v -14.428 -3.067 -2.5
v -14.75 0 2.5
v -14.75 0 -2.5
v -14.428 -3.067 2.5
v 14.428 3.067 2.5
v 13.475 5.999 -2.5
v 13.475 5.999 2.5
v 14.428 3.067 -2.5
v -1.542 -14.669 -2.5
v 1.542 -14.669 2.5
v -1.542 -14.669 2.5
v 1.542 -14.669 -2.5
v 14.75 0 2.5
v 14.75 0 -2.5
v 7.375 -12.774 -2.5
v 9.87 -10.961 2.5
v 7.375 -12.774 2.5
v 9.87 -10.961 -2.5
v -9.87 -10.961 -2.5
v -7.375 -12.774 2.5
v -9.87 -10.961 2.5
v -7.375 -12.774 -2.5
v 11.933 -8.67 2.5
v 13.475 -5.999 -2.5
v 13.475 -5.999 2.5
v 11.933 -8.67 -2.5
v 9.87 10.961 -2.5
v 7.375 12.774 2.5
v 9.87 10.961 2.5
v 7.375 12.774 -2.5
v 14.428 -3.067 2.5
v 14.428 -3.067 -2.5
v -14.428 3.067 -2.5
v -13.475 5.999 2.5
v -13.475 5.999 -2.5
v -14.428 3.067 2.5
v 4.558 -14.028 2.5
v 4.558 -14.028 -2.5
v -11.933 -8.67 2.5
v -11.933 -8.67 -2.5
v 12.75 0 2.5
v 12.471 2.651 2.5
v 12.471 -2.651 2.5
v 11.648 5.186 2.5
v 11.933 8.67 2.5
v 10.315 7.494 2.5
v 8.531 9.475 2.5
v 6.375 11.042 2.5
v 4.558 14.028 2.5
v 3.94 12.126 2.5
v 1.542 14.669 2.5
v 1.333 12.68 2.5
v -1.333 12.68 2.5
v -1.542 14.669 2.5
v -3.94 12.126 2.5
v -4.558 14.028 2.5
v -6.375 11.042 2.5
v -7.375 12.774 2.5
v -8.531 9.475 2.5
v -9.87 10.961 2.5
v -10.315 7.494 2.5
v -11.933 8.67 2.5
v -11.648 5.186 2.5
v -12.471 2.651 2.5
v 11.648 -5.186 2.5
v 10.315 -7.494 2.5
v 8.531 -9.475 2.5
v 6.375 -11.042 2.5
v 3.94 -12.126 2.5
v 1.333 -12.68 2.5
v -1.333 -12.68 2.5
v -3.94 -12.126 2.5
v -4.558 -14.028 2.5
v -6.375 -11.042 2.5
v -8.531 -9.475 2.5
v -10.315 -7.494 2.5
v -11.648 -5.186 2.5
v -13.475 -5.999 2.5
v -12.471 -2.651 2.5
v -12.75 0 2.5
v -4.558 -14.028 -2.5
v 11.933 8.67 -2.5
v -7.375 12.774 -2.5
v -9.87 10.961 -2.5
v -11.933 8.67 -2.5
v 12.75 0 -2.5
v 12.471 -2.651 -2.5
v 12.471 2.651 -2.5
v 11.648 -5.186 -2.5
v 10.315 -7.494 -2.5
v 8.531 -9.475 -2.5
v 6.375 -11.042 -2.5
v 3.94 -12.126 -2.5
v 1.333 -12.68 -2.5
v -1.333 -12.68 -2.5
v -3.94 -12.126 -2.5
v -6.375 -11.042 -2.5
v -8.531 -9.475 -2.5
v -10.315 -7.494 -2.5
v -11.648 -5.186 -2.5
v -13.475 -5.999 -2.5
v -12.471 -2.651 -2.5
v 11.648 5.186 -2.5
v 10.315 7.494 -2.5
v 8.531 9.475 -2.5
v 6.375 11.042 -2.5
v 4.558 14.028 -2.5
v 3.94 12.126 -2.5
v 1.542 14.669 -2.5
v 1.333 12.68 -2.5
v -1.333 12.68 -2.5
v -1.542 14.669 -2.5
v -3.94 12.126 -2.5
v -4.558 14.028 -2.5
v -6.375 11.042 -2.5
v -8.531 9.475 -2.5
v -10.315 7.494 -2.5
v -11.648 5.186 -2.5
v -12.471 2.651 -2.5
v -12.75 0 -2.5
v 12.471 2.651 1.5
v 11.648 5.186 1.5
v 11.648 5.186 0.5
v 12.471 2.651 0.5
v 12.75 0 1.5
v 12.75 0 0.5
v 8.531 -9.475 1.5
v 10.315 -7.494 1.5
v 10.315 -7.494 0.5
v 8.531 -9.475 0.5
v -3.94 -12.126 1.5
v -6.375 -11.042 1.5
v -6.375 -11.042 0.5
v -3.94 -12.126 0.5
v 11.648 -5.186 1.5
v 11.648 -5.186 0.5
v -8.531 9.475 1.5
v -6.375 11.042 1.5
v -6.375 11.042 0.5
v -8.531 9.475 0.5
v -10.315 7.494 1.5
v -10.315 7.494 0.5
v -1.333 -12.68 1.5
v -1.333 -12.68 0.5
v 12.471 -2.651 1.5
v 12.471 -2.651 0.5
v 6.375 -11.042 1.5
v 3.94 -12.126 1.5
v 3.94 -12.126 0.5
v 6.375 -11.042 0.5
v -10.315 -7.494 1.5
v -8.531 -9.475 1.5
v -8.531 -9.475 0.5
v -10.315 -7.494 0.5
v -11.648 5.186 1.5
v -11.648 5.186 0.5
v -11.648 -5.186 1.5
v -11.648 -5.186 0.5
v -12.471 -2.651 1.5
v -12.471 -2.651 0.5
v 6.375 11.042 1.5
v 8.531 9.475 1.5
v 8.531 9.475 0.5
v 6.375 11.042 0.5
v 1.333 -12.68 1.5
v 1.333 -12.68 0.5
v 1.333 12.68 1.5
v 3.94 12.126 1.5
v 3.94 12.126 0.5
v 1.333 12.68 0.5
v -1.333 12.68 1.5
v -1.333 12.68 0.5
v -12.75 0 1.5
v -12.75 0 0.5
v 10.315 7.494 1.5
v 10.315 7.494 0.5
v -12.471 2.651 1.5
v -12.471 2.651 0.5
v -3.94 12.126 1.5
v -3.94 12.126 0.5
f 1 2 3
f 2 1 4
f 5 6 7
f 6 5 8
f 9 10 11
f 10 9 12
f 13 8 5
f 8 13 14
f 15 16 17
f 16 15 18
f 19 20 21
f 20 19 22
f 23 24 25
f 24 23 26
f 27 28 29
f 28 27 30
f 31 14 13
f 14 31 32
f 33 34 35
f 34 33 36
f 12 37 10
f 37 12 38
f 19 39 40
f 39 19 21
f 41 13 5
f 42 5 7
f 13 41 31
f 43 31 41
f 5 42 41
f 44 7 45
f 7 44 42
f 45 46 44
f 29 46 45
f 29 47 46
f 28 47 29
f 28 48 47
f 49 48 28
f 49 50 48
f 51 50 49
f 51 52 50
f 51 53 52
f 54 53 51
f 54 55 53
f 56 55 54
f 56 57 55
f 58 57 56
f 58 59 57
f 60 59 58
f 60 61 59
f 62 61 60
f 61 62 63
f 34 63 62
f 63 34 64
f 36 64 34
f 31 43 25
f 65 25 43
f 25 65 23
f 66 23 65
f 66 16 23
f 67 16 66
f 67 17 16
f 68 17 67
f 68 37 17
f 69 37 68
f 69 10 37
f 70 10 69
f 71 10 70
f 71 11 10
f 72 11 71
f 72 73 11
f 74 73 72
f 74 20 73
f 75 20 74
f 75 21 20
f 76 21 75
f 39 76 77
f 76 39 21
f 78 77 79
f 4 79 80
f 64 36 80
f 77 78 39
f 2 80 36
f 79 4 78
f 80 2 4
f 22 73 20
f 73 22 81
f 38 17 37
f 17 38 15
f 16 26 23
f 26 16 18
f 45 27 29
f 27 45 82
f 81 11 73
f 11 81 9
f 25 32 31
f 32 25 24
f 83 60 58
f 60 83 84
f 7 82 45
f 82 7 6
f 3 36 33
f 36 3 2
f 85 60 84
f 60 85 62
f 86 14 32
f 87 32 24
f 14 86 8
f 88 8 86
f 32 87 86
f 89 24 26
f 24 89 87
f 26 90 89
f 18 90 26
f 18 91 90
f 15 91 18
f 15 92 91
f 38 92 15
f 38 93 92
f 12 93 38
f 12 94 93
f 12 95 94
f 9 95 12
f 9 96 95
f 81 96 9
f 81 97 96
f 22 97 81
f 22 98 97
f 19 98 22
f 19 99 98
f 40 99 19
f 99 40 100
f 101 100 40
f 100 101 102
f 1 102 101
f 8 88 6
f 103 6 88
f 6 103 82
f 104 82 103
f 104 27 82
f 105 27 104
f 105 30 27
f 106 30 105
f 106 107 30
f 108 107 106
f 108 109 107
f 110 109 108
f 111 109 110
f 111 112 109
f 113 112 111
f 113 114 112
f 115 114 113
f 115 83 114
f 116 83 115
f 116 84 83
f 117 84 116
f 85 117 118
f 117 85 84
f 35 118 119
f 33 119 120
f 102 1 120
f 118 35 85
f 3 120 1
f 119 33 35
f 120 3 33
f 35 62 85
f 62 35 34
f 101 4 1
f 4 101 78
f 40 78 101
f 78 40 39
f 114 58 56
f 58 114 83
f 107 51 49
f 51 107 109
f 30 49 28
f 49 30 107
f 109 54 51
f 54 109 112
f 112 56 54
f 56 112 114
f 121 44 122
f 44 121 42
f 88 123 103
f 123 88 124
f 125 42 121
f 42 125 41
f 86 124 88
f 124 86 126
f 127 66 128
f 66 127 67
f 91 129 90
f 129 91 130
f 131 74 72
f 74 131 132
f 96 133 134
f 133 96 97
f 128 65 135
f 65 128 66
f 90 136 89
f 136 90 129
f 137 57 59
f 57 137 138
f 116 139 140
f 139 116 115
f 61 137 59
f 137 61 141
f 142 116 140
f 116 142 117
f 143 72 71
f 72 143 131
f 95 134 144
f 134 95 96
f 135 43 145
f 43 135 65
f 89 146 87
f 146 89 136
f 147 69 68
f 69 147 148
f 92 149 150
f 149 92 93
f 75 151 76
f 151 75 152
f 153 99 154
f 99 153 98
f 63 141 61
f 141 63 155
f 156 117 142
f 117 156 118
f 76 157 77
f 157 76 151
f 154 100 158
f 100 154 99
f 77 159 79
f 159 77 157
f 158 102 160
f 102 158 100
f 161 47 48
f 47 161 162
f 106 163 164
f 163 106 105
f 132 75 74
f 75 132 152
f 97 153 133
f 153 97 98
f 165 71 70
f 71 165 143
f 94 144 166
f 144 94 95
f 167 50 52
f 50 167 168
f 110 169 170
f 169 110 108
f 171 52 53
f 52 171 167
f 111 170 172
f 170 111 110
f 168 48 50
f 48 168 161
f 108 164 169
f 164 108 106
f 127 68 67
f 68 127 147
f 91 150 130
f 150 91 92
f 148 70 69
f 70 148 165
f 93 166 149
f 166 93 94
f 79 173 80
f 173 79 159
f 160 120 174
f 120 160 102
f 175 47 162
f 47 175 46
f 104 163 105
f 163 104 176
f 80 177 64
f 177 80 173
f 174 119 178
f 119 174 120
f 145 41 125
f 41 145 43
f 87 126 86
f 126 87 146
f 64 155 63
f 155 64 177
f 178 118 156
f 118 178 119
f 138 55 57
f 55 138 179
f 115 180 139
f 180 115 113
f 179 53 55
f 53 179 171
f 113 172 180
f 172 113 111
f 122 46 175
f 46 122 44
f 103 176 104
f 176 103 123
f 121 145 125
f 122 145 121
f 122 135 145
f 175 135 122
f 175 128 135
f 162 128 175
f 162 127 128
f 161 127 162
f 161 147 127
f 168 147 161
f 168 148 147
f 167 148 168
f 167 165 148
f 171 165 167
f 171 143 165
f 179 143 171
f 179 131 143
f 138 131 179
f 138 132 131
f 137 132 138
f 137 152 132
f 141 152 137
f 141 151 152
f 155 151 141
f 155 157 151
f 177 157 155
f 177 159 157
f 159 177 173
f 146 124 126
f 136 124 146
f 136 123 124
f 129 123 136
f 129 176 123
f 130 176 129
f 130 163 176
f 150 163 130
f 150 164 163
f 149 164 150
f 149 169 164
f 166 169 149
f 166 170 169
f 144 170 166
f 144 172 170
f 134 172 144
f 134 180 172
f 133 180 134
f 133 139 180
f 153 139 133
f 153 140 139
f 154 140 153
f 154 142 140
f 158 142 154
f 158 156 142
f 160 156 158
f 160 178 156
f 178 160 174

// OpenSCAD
//! Keychain Body.

// Make a hollow outer ring.

// Difference extrudes the first object, and then remove all following objects inside the difference.
difference() {
    // Extrude the outer body up by 5mm.
    // Center being true effectively extrudes half the height in both directions from the middle of that height.
    linear_extrude(height = 5, center = true)

    // Draw a circle with a diameter of 25.5mm (space needed for an NFC sticker),
    // plus a 2mm with border times 2 because we're explicitly setting the (d)iameter instead of radius.
    circle(d = 25.5 + 2 * 2);

    // The semi colon above ends this object, which is just the body.
    // All following objects will remove from the above object instead of drawing more new objects.

    // Extrude the inner body up by 6mm.
    // Any number greater than the height of the above object can be used.
    // A number exactly the same may leave a 0 width surface that will confuse object slicers for 3D printing.
    // Center being true effectively extrudes half the height in both directions from the middle of that height.
    linear_extrude(height = 6, center = true)

    // Draw a circle with a diameter of 25.5mm (space needed for an NFC sticker).
    circle(d = 25.5);
}


// Make a panel inside the hollow ring.

// Move the panel up the z-axis by 1mm.
// Note that the hollow ring is 2.5mm high on each side of the z-axis.
translate([0, 0, 1])

// Extrude the panel up 1mm.
// Center being true effectively extrudes half the height in both directions from the middle of that height.
// This means the panel starts 0.5mm above z = 0, fills 1mm, and leaves 0.5mm of space to the face of the hollow ring.
linear_extrude(height = 1, center = true)

// Draw a circle with a diameter of 25.5mm (space needed for an NFC sticker),
// plus a 1mm with border times 2 because we're explicitly setting the (d)iameter instead of radius.
// A number of 25.5 exactly may leave a 0 width gap between the panel and the hollow ring
// that will confuse object slicers for 3D printing.
circle(d = 25.5 + 1 * 2);

// The semi colon above ends this object, which is just the logo.
